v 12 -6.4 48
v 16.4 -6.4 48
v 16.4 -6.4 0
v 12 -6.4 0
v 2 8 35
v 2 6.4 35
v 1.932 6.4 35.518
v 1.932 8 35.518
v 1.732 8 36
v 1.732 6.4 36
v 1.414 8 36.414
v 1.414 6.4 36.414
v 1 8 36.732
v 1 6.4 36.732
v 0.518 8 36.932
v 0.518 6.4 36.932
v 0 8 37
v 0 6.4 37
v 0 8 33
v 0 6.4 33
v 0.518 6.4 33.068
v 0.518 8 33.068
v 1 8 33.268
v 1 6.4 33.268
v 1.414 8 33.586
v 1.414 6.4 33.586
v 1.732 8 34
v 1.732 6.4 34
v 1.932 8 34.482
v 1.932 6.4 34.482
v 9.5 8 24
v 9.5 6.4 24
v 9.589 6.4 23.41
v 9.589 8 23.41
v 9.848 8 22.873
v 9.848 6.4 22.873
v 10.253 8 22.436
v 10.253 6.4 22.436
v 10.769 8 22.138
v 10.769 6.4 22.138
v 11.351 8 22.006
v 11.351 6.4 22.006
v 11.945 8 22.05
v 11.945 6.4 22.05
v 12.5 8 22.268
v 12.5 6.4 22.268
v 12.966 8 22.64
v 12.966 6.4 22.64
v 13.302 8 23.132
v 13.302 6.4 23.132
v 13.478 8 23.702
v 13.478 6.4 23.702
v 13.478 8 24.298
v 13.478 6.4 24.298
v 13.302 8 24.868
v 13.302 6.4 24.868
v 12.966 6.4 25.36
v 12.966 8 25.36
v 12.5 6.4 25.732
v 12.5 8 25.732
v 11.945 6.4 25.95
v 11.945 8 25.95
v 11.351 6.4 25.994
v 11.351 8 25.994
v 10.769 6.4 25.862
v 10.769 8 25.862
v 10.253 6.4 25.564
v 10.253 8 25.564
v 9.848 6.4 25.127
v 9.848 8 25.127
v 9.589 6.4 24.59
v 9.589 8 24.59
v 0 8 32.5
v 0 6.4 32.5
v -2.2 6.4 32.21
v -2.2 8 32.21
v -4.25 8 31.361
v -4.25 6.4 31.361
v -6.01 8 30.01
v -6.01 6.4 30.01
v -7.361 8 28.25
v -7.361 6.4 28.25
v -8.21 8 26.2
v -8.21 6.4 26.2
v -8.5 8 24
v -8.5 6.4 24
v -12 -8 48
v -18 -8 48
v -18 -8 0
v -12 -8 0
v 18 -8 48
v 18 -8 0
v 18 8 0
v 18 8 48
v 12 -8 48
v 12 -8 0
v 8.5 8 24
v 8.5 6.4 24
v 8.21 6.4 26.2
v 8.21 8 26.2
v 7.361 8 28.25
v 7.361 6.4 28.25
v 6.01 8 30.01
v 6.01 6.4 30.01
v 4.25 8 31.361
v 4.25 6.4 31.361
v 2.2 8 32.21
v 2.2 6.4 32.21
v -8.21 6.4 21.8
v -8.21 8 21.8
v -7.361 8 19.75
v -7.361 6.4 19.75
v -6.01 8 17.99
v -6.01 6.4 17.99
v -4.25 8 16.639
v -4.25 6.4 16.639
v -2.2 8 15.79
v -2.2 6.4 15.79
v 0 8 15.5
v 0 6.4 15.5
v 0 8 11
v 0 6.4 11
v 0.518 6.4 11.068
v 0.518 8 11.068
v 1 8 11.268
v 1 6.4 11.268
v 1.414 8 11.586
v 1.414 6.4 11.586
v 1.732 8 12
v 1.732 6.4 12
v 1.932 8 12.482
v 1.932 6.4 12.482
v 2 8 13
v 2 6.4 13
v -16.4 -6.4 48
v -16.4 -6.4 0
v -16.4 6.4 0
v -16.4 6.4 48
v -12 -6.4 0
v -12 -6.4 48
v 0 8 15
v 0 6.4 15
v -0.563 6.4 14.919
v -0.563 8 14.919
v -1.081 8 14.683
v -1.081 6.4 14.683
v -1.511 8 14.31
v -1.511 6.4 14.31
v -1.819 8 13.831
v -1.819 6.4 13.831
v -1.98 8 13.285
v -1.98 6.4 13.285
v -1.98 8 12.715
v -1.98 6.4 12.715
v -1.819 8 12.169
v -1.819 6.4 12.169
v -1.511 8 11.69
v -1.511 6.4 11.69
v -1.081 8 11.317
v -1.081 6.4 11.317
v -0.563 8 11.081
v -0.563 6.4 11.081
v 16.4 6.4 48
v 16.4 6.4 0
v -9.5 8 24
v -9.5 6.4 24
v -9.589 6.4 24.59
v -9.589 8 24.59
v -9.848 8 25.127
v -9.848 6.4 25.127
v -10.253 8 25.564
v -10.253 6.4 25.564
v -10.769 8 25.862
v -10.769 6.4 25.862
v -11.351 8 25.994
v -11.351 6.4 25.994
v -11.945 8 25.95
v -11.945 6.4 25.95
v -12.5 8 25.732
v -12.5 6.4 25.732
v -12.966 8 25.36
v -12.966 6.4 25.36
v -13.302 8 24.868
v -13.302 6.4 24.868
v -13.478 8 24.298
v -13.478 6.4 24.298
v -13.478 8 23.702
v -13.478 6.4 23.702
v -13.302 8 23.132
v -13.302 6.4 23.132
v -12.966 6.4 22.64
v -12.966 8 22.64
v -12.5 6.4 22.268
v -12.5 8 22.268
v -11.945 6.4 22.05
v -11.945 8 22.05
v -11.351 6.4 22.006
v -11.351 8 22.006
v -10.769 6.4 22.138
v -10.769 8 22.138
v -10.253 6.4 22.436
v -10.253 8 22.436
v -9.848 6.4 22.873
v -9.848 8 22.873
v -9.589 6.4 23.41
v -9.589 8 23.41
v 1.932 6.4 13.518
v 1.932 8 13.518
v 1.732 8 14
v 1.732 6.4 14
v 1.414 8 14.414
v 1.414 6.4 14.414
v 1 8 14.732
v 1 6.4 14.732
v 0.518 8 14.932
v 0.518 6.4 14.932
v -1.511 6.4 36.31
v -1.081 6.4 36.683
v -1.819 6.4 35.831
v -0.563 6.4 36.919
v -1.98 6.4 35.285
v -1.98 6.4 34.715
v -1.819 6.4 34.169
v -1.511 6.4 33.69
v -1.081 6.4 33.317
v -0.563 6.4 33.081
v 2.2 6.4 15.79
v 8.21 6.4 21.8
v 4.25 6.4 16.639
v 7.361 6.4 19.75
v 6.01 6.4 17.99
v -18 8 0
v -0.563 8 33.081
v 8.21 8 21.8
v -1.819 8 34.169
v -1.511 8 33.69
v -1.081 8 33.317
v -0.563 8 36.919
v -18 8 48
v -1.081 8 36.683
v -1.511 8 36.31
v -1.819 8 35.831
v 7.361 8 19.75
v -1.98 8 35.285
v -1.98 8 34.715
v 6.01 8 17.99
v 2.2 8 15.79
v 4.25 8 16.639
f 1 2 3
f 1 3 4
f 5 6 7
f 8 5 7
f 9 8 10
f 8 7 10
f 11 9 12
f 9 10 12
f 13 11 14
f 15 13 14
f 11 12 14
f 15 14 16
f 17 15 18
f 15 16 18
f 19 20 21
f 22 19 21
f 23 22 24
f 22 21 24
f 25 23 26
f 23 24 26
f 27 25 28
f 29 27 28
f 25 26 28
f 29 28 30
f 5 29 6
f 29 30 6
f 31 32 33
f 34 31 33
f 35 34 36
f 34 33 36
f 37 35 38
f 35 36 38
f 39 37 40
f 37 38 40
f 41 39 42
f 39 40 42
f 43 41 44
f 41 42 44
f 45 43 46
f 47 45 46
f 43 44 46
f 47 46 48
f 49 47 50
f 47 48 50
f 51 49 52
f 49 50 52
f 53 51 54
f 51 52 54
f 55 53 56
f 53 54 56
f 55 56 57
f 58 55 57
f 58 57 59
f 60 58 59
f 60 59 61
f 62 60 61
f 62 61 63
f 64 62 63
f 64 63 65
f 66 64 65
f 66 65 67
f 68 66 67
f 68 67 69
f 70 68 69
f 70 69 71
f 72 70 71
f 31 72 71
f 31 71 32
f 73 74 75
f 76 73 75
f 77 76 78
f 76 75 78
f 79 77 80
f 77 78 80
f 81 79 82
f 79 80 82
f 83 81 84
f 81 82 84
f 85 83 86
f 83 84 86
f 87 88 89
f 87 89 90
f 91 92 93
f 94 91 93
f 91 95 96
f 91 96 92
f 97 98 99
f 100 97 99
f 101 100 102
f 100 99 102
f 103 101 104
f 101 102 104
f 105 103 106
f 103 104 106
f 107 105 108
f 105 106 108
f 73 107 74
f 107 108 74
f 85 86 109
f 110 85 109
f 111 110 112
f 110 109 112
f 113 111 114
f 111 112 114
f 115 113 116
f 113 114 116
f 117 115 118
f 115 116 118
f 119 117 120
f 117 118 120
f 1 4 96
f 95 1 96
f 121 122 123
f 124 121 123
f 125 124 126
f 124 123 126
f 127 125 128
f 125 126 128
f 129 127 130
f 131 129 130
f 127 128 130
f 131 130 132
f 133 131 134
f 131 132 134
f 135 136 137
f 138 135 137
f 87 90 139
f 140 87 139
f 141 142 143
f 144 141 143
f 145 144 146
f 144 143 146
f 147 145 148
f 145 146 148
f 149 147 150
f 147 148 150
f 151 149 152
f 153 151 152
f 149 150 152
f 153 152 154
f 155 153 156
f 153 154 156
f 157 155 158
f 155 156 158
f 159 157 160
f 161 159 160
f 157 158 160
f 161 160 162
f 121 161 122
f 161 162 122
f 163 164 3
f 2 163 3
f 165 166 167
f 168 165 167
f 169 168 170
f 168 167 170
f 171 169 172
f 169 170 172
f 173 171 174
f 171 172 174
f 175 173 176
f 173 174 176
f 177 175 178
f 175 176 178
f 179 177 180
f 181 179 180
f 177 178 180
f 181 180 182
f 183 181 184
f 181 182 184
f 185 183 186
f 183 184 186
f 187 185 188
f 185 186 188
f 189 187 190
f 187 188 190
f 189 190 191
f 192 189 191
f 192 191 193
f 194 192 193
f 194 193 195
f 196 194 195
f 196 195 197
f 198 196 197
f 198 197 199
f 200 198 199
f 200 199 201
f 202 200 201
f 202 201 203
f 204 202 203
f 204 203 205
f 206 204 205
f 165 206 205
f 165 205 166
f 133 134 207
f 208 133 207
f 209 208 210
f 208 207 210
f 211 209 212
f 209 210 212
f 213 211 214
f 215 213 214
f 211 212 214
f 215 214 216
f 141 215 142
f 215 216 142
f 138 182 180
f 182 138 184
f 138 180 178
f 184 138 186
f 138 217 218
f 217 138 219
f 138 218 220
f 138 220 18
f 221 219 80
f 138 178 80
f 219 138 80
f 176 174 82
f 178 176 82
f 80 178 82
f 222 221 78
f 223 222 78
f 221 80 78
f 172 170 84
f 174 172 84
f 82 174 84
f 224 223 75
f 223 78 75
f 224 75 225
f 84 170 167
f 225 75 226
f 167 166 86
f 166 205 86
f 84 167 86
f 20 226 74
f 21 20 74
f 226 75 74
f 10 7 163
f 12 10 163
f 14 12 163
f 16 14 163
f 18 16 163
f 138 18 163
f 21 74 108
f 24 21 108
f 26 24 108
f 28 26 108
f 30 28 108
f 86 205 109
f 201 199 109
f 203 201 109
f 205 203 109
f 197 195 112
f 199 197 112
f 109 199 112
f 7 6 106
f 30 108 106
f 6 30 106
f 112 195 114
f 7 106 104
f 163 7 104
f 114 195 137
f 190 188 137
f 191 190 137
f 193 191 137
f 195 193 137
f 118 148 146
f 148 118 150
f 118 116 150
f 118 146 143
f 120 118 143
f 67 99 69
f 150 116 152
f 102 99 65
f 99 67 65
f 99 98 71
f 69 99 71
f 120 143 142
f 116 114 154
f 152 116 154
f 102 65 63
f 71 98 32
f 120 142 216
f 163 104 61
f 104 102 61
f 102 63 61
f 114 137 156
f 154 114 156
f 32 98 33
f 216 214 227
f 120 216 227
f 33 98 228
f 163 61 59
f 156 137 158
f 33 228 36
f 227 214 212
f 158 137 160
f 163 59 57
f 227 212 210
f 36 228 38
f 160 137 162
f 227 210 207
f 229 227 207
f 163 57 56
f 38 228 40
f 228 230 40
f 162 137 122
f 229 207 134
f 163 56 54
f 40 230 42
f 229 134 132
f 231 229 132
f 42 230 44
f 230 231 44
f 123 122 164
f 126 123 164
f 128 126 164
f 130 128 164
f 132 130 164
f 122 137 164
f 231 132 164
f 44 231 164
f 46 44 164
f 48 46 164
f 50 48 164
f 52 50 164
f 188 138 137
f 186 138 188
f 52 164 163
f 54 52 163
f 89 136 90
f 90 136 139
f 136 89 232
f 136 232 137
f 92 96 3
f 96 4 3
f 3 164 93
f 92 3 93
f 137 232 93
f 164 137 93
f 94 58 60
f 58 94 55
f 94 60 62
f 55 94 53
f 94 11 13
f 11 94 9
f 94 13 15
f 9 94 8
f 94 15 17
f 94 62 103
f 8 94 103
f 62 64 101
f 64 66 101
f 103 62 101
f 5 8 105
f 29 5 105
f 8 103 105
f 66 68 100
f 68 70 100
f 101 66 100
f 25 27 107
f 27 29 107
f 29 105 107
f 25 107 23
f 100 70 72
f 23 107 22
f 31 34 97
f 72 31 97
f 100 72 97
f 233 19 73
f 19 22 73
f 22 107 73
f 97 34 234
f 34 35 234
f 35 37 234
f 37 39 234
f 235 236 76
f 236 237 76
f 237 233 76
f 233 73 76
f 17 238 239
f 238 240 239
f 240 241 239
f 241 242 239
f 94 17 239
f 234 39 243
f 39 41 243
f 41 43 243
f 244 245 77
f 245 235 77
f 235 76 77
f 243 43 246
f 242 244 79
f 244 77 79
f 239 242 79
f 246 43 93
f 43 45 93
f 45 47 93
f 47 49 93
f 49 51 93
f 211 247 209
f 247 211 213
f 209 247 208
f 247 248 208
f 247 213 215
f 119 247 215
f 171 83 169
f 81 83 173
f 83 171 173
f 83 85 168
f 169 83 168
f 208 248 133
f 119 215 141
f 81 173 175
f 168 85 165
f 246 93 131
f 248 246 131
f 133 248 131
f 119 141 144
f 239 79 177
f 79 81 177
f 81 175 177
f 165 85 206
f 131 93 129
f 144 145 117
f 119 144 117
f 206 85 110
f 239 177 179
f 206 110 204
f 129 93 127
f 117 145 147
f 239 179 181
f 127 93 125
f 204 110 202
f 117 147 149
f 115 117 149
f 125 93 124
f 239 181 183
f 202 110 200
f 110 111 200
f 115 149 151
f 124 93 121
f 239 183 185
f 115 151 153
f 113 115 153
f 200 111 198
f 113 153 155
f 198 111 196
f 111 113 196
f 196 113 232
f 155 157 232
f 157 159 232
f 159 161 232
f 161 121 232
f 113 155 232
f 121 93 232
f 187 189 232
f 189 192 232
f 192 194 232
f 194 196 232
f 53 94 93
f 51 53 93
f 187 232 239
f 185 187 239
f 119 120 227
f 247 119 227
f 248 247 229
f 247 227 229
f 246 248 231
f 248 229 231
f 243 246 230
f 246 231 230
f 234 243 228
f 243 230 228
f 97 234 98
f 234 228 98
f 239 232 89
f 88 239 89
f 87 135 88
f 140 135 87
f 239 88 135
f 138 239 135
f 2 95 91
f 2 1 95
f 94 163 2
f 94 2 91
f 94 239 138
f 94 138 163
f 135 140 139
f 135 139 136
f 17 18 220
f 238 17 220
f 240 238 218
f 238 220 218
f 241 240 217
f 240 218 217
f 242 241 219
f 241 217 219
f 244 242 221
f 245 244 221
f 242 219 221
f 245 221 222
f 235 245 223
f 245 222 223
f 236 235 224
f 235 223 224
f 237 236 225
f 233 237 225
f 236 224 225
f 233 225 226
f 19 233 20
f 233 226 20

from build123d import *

# Parameters (mm, degrees)
F1_DEPTH = 48
F3_DEPTH = 25
F4_DEPTH = 25
F5_DEPTH = 25


with BuildPart() as f1:
    # F0 (on Top) → F1 (new body)
    with BuildSketch(Plane.XY):
        Polygon((12, -8), (18, -8), (18, 8), (-18, 8), (-18, -8), (-12, -8), (-12, -6.4), (-16.4, -6.4), (-16.4, 6.4), (16.4, 6.4), (16.4, -6.4), (12, -6.4), align=None)
    extrude(amount=F1_DEPTH)

    # F2 (on face) → F3 (cut)
    with BuildSketch(Plane.XZ.offset(-6.4)):
        with BuildLine():
            Line((0, 24), (0, 32.5))
            ThreePointArc((0, 32.5), (-6.0104076401, 30.0104076401), (-8.5, 24))
            Line((-8.5, 24), (0, 24))
        make_face()
        with BuildLine():
            ThreePointArc((8.5, 24), (6.0104076401, 30.0104076401), (0, 32.5))
            Line((0, 32.5), (0, 24))
            Line((0, 24), (8.5, 24))
        make_face()
        with BuildLine():
            Line((0, 15.5), (0, 24))
            Line((0, 24), (-8.5, 24))
            ThreePointArc((-8.5, 24), (-6.0104076401, 17.9895923599), (0, 15.5))
        make_face()
        with BuildLine():
            Line((8.5, 24), (0, 24))
            Line((0, 24), (0, 15.5))
            ThreePointArc((0, 15.5), (6.0104076401, 17.9895923599), (8.5, 24))
        make_face()
    extrude(amount=-F3_DEPTH, mode=Mode.SUBTRACT)

    # F2 (on face) → F4 (cut)
    with BuildSketch(Plane.XZ.offset(-6.4)):
        with BuildLine():
            Line((0, 15), (0, 11))
            ThreePointArc((0, 11), (1.4142135624, 11.5857864376), (2, 13))
            ThreePointArc((2, 13), (1.4142135624, 14.4142135624), (0, 15))
        make_face()
        with BuildLine():
            ThreePointArc((0, 15), (-2, 13), (0, 11))
            Line((0, 11), (0, 15))
        make_face()
        with BuildLine():
            Line((0, 33), (0, 37))
            ThreePointArc((0, 37), (-2, 35), (0, 33))
        make_face()
        with BuildLine():
            ThreePointArc((2, 35), (1.4142135624, 36.4142135624), (0, 37))
            Line((0, 37), (0, 33))
            ThreePointArc((0, 33), (1.4142135624, 33.5857864376), (2, 35))
        make_face()
    extrude(amount=-F4_DEPTH, mode=Mode.SUBTRACT)

    # F2 (on face) → F5 (cut)
    with BuildSketch(Plane.XZ.offset(-6.4)):
        with BuildLine():
            Line((-9.5, 24), (-13.5, 24))
            ThreePointArc((-13.5, 24), (-11.5, 22), (-9.5, 24))
        make_face()
        with BuildLine():
            ThreePointArc((-9.5, 24), (-11.5, 26), (-13.5, 24))
            Line((-13.5, 24), (-9.5, 24))
        make_face()
        with BuildLine():
            Line((9.5, 24), (13.5, 24))
            ThreePointArc((13.5, 24), (11.5, 26), (9.5, 24))
        make_face()
        with BuildLine():
            ThreePointArc((9.5, 24), (11.5, 22), (13.5, 24))
            Line((13.5, 24), (9.5, 24))
        make_face()
    extrude(amount=-F5_DEPTH, mode=Mode.SUBTRACT)


solid = f1.part
